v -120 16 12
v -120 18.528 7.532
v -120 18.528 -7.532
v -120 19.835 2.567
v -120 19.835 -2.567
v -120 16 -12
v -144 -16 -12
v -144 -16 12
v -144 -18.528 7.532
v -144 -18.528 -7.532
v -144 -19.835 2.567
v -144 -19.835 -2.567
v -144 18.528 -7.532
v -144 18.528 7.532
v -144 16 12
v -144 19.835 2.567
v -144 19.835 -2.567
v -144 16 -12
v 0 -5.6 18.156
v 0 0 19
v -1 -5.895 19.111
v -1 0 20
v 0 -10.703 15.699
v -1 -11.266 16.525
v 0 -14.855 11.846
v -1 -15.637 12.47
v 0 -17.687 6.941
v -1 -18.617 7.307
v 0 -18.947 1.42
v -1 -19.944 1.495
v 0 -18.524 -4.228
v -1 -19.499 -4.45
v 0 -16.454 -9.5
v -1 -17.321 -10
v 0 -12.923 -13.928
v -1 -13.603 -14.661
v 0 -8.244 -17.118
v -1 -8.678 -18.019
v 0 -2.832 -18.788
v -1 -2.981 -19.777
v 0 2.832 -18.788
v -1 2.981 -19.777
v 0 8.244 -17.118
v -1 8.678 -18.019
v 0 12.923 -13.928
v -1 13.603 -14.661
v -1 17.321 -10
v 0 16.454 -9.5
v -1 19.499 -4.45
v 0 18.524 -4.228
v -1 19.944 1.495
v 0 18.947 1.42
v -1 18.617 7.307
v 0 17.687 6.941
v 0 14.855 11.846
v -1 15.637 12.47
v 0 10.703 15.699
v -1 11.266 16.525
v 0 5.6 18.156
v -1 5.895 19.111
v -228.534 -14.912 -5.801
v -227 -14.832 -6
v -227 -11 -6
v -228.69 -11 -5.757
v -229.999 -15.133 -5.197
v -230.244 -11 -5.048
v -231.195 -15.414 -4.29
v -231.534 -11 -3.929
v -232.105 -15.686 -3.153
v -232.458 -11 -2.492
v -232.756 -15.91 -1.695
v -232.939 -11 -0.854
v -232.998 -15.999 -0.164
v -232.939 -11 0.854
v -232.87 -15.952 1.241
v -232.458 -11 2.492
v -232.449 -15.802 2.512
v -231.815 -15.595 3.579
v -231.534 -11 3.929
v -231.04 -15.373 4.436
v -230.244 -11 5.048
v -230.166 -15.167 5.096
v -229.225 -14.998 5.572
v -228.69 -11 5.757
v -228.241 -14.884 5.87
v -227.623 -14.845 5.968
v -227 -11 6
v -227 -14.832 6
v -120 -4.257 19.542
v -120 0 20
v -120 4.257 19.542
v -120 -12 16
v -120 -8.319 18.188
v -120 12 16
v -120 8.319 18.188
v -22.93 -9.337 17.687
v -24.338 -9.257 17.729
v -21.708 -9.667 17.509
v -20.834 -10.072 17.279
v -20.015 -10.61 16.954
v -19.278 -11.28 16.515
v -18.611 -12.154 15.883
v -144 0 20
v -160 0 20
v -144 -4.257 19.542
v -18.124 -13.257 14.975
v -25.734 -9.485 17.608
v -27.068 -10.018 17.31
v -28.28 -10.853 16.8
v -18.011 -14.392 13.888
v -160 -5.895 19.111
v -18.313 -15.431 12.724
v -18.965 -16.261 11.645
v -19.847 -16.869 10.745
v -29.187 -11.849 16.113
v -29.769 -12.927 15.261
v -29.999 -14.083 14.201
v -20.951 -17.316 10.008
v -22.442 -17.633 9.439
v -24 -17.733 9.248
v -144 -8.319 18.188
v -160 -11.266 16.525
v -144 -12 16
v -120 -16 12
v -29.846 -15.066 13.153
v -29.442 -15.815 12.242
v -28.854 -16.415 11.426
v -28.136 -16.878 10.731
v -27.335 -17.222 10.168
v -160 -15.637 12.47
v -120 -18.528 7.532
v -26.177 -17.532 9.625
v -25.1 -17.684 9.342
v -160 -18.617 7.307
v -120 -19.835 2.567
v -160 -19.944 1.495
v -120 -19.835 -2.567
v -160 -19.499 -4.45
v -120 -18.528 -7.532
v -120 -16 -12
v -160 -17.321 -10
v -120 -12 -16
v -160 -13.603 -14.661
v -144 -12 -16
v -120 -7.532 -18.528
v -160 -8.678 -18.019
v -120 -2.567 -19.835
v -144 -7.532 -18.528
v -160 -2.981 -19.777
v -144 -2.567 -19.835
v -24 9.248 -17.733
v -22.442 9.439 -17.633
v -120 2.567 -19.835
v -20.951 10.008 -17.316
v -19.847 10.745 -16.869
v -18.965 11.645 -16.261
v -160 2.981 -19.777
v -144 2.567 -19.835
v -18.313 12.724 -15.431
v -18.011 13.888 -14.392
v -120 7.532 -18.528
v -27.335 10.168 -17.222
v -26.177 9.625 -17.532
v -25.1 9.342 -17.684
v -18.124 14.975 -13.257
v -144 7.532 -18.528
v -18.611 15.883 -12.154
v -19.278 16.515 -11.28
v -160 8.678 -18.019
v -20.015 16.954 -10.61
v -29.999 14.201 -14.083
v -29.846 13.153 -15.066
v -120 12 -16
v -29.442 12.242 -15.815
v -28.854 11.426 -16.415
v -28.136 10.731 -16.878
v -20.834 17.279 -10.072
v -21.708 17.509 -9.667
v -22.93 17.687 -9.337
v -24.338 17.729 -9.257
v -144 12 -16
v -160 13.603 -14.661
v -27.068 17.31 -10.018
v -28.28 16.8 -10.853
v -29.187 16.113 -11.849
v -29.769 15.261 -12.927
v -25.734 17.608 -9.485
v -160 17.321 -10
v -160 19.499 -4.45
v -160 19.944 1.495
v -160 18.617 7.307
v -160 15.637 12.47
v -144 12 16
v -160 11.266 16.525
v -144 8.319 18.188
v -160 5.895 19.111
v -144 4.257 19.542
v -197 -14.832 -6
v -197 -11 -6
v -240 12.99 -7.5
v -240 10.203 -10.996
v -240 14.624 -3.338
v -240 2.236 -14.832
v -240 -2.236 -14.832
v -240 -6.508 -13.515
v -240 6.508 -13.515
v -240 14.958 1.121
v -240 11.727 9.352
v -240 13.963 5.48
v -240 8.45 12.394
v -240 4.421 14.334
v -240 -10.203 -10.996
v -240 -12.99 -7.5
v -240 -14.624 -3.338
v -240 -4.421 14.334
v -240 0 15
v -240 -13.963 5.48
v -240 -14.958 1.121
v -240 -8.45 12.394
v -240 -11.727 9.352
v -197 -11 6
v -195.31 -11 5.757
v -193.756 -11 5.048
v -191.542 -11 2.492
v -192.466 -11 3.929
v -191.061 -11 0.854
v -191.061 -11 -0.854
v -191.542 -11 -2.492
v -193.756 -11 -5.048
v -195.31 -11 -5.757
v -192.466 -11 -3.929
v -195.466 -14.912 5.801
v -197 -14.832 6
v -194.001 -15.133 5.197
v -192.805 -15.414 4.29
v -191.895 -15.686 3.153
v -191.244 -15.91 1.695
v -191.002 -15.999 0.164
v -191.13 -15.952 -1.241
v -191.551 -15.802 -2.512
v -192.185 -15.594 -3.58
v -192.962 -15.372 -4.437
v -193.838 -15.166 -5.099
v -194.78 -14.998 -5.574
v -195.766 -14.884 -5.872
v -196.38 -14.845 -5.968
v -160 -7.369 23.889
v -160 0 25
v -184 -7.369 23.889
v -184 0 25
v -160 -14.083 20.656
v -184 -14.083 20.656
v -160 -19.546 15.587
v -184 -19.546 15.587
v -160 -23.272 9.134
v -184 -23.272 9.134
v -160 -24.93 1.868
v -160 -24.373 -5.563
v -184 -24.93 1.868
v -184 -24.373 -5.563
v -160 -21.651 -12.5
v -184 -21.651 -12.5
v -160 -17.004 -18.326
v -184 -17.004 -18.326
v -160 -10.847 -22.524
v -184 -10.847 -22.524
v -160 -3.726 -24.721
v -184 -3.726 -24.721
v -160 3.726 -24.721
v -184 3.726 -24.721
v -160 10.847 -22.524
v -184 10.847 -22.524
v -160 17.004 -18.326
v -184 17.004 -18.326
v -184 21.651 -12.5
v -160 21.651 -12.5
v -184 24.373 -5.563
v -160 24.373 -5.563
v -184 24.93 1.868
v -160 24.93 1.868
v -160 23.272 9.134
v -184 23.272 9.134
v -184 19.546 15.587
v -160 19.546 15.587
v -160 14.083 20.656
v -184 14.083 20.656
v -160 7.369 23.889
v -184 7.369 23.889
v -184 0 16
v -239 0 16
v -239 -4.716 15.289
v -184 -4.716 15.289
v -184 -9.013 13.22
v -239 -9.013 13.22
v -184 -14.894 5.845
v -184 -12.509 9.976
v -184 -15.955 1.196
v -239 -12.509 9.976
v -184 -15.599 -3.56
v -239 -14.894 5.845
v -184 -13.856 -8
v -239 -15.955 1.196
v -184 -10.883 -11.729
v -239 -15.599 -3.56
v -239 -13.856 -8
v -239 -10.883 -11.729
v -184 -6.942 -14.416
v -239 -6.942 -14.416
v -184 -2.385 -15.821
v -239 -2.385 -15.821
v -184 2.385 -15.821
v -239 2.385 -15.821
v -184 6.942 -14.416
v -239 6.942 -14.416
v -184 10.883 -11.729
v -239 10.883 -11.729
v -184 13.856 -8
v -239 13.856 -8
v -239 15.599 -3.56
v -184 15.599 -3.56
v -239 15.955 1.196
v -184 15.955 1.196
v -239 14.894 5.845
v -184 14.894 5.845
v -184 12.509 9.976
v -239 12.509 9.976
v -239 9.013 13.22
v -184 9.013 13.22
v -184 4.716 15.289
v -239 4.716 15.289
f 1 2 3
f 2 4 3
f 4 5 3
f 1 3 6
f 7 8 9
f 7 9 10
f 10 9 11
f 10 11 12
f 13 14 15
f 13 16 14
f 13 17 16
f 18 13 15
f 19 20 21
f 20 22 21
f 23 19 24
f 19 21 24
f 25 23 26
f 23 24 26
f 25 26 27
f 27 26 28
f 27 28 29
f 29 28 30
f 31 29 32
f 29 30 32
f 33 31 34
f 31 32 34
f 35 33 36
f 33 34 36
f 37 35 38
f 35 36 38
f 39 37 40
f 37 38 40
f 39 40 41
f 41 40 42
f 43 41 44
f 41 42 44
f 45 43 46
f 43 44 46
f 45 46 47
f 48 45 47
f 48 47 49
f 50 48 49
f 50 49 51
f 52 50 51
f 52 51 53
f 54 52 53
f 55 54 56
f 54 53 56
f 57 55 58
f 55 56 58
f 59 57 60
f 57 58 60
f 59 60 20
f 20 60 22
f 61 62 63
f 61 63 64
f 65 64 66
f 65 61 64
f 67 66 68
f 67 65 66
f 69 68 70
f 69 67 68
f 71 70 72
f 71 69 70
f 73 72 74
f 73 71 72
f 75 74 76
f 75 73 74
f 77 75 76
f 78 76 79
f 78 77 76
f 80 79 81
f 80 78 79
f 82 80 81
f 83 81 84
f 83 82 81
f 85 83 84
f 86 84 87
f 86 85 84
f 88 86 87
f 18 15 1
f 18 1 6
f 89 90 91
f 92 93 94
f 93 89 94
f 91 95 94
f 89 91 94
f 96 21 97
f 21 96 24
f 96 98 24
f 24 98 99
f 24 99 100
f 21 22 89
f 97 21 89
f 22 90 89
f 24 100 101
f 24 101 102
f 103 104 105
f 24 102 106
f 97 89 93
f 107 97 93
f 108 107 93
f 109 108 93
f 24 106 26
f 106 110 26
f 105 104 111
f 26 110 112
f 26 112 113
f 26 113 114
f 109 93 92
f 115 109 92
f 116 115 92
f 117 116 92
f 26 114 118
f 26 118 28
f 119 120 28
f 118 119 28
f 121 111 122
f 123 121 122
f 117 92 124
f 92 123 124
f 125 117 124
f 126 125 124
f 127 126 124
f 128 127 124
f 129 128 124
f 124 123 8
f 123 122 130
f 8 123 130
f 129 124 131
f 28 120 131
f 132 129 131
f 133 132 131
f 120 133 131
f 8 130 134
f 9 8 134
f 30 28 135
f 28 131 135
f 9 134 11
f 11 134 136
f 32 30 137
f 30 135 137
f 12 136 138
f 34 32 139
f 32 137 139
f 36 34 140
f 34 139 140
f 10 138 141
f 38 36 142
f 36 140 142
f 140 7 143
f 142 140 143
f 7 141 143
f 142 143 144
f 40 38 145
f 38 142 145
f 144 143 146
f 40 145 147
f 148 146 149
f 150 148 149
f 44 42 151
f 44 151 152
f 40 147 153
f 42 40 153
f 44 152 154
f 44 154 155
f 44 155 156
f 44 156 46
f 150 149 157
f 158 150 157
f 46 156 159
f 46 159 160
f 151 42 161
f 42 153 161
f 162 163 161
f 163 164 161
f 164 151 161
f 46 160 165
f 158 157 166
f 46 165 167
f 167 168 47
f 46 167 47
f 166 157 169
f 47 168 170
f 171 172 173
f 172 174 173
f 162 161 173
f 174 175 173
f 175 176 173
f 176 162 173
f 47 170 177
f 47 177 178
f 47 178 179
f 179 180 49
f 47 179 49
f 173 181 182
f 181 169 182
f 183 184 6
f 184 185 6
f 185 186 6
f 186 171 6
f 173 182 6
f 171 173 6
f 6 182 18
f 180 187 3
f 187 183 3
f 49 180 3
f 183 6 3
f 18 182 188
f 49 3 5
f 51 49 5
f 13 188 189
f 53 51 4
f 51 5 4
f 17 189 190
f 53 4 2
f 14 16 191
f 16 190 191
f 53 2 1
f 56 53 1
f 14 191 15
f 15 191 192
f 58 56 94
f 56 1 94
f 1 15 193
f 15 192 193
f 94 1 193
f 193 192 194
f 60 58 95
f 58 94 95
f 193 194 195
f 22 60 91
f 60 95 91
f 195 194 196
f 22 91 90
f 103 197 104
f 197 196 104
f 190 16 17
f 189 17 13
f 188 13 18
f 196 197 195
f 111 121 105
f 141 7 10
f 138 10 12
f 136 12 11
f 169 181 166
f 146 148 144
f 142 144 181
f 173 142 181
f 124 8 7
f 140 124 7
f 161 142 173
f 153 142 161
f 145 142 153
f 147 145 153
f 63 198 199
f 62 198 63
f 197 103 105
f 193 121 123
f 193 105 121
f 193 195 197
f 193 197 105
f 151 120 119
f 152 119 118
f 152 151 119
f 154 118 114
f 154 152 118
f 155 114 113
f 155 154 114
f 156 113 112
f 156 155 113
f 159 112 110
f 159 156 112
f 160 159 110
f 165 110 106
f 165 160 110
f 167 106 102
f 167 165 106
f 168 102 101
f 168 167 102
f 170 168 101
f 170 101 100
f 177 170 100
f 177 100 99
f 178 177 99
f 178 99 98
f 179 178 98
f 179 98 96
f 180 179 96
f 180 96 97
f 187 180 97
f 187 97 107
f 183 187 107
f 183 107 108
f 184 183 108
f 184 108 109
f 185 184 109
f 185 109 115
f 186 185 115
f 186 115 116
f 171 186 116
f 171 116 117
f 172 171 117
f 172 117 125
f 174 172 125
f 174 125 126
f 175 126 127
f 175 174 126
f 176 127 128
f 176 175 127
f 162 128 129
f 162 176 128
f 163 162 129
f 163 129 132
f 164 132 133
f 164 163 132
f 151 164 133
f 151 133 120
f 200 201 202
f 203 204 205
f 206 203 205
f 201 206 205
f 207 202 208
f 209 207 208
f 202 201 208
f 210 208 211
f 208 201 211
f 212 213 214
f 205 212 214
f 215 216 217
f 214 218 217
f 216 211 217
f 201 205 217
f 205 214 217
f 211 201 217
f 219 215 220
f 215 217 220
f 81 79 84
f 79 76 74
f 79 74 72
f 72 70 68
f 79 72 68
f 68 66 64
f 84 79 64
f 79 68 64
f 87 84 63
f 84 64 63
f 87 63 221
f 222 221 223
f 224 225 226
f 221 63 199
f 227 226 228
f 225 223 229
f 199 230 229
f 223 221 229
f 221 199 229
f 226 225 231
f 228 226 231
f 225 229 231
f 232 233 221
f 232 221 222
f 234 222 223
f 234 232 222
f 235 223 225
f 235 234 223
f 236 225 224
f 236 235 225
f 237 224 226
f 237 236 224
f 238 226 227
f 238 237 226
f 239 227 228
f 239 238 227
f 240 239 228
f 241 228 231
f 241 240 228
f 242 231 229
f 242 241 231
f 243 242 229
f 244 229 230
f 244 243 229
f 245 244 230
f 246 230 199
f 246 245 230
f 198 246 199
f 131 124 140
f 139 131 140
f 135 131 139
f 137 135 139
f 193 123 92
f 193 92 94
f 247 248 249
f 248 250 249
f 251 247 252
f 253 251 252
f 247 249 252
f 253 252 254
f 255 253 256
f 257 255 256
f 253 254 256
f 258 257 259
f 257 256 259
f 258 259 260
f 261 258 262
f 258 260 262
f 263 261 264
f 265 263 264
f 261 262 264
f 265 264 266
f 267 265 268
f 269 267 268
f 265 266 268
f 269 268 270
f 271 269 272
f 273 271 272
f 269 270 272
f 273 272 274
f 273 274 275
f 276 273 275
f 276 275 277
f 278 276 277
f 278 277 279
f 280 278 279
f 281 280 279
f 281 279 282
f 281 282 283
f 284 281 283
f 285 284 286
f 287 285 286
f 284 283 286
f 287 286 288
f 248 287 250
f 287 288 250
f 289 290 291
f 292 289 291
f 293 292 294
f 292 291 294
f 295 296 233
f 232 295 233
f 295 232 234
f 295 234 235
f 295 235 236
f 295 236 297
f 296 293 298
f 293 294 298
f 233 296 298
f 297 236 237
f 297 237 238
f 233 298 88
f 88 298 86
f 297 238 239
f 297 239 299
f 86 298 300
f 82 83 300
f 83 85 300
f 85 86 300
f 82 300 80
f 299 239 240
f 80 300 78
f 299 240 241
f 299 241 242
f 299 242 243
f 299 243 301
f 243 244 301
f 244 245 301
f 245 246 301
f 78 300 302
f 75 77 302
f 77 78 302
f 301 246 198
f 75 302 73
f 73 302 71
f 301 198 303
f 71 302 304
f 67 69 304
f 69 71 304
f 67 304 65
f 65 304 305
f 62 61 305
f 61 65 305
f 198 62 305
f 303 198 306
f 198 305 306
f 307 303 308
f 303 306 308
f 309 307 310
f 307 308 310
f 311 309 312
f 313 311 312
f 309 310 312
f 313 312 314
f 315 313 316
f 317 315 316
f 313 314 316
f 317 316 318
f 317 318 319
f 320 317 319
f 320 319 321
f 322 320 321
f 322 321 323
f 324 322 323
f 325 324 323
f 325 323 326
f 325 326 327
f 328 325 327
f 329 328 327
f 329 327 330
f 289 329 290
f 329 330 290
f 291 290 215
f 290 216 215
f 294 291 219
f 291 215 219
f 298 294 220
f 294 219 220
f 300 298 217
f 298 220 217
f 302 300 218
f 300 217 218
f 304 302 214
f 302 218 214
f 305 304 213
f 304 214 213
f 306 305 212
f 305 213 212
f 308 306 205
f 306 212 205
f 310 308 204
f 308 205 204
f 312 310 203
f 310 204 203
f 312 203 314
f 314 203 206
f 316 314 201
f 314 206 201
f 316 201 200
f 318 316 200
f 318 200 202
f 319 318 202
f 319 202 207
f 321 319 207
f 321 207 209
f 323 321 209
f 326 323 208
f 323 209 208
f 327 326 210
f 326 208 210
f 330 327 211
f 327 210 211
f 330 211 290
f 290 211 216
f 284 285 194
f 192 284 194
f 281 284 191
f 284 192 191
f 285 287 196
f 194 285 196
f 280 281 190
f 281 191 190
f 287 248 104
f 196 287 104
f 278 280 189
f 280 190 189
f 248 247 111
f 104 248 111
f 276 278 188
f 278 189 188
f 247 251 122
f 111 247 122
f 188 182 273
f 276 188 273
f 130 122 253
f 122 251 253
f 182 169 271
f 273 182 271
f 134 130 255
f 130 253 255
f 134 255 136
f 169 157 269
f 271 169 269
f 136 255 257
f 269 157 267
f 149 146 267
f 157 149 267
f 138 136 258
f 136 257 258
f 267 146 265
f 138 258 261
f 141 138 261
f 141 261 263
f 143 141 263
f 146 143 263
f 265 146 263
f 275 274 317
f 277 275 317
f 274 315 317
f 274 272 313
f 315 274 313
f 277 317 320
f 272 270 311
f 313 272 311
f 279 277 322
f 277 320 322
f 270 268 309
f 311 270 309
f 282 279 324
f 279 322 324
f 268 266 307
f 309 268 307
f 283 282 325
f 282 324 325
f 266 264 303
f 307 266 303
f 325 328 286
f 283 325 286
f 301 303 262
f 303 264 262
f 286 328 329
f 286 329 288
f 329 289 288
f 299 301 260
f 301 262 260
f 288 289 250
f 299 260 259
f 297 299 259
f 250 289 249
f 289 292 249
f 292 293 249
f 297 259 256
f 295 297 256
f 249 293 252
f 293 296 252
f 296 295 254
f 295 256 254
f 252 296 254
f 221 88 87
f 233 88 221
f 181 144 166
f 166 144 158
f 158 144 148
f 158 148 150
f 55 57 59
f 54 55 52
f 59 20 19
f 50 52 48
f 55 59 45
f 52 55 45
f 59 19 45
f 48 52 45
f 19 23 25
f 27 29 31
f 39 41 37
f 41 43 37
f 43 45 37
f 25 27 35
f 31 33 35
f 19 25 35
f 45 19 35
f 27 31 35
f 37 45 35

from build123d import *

# Parameters (mm, degrees)
SKETCH_2_OUTSIDE_W       = 102.04
SKETCH_2_OUTSIDE_H       = 102.04
SKETCH_2_OUTSIDE_W_2     = 32
SKETCH_2_OUTSIDE_H_2     = 32
CUT_EXTRUDE_1_DEPTH      = 24
CUT_EXTRUDE_2_DEPTH      = 5
CUT_EXTRUDE_3_DEPTH      = 243.590189414
CUT_EXTRUDE_3_DEPTH_BACK = 243.590189414
SKETCH_4_R               = 6


with BuildPart() as part:
    # Эскиз1 → Повернуть1 (revolve)
    with BuildSketch(Plane.XY, mode=Mode.PRIVATE) as revolve_1_sk:
        Polygon((0, 0), (0, 19), (-1, 20), (-160, 20), (-160, 25), (-184, 25), (-184, 16), (-239, 16), (-240, 15), (-240, 0), align=None)
    revolve(revolve_1_sk.sketch.rotate(Axis((-178.322580645, 0, 0), (1, 0, 0)), 90), axis=Axis((-178.322580645, 0, 0), (1, 0, 0)))

    # Эскиз2 outside → Вырез-Вытянуть1 (cut)
    with BuildSketch(Plane(origin=(-144, 0, 0), x_dir=(0, 0, -1), z_dir=(1, 0, 0))):
        Rectangle(SKETCH_2_OUTSIDE_W, SKETCH_2_OUTSIDE_H)
        Rectangle(SKETCH_2_OUTSIDE_W_2, SKETCH_2_OUTSIDE_H_2, mode=Mode.SUBTRACT)
    extrude(amount=CUT_EXTRUDE_1_DEPTH, mode=Mode.SUBTRACT)

    # Эскиз3 → Вырез-Вытянуть2 (cut)
    with BuildSketch(Plane(origin=(0, -16, 0), x_dir=(-1, 0, 0), z_dir=(0, -1, 0))):
        with BuildLine():
            Line((227, -6), (197, -6))
            ThreePointArc((197, -6), (191, 0), (197, 6))
            Line((197, 6), (227, 6))
            ThreePointArc((227, 6), (233, 0), (227, -6))
        make_face()
    extrude(amount=-CUT_EXTRUDE_2_DEPTH, mode=Mode.SUBTRACT)

    # Эскиз4 → Вырез-Вытянуть3 (cut, two sides: drawn at the far end of the back side and taken through both)
    with BuildSketch(Plane(origin=(0, 0, 0), x_dir=(-1, 0, 0), z_dir=(0, -0.7071067811865488, 0.7071067811865464)).offset(-CUT_EXTRUDE_3_DEPTH_BACK)):
        with Locations(Location((24, 0, 0), (0, 0, 90))):
            Circle(SKETCH_4_R)
    extrude(amount=CUT_EXTRUDE_3_DEPTH + CUT_EXTRUDE_3_DEPTH_BACK, mode=Mode.SUBTRACT)


solid = part.part
